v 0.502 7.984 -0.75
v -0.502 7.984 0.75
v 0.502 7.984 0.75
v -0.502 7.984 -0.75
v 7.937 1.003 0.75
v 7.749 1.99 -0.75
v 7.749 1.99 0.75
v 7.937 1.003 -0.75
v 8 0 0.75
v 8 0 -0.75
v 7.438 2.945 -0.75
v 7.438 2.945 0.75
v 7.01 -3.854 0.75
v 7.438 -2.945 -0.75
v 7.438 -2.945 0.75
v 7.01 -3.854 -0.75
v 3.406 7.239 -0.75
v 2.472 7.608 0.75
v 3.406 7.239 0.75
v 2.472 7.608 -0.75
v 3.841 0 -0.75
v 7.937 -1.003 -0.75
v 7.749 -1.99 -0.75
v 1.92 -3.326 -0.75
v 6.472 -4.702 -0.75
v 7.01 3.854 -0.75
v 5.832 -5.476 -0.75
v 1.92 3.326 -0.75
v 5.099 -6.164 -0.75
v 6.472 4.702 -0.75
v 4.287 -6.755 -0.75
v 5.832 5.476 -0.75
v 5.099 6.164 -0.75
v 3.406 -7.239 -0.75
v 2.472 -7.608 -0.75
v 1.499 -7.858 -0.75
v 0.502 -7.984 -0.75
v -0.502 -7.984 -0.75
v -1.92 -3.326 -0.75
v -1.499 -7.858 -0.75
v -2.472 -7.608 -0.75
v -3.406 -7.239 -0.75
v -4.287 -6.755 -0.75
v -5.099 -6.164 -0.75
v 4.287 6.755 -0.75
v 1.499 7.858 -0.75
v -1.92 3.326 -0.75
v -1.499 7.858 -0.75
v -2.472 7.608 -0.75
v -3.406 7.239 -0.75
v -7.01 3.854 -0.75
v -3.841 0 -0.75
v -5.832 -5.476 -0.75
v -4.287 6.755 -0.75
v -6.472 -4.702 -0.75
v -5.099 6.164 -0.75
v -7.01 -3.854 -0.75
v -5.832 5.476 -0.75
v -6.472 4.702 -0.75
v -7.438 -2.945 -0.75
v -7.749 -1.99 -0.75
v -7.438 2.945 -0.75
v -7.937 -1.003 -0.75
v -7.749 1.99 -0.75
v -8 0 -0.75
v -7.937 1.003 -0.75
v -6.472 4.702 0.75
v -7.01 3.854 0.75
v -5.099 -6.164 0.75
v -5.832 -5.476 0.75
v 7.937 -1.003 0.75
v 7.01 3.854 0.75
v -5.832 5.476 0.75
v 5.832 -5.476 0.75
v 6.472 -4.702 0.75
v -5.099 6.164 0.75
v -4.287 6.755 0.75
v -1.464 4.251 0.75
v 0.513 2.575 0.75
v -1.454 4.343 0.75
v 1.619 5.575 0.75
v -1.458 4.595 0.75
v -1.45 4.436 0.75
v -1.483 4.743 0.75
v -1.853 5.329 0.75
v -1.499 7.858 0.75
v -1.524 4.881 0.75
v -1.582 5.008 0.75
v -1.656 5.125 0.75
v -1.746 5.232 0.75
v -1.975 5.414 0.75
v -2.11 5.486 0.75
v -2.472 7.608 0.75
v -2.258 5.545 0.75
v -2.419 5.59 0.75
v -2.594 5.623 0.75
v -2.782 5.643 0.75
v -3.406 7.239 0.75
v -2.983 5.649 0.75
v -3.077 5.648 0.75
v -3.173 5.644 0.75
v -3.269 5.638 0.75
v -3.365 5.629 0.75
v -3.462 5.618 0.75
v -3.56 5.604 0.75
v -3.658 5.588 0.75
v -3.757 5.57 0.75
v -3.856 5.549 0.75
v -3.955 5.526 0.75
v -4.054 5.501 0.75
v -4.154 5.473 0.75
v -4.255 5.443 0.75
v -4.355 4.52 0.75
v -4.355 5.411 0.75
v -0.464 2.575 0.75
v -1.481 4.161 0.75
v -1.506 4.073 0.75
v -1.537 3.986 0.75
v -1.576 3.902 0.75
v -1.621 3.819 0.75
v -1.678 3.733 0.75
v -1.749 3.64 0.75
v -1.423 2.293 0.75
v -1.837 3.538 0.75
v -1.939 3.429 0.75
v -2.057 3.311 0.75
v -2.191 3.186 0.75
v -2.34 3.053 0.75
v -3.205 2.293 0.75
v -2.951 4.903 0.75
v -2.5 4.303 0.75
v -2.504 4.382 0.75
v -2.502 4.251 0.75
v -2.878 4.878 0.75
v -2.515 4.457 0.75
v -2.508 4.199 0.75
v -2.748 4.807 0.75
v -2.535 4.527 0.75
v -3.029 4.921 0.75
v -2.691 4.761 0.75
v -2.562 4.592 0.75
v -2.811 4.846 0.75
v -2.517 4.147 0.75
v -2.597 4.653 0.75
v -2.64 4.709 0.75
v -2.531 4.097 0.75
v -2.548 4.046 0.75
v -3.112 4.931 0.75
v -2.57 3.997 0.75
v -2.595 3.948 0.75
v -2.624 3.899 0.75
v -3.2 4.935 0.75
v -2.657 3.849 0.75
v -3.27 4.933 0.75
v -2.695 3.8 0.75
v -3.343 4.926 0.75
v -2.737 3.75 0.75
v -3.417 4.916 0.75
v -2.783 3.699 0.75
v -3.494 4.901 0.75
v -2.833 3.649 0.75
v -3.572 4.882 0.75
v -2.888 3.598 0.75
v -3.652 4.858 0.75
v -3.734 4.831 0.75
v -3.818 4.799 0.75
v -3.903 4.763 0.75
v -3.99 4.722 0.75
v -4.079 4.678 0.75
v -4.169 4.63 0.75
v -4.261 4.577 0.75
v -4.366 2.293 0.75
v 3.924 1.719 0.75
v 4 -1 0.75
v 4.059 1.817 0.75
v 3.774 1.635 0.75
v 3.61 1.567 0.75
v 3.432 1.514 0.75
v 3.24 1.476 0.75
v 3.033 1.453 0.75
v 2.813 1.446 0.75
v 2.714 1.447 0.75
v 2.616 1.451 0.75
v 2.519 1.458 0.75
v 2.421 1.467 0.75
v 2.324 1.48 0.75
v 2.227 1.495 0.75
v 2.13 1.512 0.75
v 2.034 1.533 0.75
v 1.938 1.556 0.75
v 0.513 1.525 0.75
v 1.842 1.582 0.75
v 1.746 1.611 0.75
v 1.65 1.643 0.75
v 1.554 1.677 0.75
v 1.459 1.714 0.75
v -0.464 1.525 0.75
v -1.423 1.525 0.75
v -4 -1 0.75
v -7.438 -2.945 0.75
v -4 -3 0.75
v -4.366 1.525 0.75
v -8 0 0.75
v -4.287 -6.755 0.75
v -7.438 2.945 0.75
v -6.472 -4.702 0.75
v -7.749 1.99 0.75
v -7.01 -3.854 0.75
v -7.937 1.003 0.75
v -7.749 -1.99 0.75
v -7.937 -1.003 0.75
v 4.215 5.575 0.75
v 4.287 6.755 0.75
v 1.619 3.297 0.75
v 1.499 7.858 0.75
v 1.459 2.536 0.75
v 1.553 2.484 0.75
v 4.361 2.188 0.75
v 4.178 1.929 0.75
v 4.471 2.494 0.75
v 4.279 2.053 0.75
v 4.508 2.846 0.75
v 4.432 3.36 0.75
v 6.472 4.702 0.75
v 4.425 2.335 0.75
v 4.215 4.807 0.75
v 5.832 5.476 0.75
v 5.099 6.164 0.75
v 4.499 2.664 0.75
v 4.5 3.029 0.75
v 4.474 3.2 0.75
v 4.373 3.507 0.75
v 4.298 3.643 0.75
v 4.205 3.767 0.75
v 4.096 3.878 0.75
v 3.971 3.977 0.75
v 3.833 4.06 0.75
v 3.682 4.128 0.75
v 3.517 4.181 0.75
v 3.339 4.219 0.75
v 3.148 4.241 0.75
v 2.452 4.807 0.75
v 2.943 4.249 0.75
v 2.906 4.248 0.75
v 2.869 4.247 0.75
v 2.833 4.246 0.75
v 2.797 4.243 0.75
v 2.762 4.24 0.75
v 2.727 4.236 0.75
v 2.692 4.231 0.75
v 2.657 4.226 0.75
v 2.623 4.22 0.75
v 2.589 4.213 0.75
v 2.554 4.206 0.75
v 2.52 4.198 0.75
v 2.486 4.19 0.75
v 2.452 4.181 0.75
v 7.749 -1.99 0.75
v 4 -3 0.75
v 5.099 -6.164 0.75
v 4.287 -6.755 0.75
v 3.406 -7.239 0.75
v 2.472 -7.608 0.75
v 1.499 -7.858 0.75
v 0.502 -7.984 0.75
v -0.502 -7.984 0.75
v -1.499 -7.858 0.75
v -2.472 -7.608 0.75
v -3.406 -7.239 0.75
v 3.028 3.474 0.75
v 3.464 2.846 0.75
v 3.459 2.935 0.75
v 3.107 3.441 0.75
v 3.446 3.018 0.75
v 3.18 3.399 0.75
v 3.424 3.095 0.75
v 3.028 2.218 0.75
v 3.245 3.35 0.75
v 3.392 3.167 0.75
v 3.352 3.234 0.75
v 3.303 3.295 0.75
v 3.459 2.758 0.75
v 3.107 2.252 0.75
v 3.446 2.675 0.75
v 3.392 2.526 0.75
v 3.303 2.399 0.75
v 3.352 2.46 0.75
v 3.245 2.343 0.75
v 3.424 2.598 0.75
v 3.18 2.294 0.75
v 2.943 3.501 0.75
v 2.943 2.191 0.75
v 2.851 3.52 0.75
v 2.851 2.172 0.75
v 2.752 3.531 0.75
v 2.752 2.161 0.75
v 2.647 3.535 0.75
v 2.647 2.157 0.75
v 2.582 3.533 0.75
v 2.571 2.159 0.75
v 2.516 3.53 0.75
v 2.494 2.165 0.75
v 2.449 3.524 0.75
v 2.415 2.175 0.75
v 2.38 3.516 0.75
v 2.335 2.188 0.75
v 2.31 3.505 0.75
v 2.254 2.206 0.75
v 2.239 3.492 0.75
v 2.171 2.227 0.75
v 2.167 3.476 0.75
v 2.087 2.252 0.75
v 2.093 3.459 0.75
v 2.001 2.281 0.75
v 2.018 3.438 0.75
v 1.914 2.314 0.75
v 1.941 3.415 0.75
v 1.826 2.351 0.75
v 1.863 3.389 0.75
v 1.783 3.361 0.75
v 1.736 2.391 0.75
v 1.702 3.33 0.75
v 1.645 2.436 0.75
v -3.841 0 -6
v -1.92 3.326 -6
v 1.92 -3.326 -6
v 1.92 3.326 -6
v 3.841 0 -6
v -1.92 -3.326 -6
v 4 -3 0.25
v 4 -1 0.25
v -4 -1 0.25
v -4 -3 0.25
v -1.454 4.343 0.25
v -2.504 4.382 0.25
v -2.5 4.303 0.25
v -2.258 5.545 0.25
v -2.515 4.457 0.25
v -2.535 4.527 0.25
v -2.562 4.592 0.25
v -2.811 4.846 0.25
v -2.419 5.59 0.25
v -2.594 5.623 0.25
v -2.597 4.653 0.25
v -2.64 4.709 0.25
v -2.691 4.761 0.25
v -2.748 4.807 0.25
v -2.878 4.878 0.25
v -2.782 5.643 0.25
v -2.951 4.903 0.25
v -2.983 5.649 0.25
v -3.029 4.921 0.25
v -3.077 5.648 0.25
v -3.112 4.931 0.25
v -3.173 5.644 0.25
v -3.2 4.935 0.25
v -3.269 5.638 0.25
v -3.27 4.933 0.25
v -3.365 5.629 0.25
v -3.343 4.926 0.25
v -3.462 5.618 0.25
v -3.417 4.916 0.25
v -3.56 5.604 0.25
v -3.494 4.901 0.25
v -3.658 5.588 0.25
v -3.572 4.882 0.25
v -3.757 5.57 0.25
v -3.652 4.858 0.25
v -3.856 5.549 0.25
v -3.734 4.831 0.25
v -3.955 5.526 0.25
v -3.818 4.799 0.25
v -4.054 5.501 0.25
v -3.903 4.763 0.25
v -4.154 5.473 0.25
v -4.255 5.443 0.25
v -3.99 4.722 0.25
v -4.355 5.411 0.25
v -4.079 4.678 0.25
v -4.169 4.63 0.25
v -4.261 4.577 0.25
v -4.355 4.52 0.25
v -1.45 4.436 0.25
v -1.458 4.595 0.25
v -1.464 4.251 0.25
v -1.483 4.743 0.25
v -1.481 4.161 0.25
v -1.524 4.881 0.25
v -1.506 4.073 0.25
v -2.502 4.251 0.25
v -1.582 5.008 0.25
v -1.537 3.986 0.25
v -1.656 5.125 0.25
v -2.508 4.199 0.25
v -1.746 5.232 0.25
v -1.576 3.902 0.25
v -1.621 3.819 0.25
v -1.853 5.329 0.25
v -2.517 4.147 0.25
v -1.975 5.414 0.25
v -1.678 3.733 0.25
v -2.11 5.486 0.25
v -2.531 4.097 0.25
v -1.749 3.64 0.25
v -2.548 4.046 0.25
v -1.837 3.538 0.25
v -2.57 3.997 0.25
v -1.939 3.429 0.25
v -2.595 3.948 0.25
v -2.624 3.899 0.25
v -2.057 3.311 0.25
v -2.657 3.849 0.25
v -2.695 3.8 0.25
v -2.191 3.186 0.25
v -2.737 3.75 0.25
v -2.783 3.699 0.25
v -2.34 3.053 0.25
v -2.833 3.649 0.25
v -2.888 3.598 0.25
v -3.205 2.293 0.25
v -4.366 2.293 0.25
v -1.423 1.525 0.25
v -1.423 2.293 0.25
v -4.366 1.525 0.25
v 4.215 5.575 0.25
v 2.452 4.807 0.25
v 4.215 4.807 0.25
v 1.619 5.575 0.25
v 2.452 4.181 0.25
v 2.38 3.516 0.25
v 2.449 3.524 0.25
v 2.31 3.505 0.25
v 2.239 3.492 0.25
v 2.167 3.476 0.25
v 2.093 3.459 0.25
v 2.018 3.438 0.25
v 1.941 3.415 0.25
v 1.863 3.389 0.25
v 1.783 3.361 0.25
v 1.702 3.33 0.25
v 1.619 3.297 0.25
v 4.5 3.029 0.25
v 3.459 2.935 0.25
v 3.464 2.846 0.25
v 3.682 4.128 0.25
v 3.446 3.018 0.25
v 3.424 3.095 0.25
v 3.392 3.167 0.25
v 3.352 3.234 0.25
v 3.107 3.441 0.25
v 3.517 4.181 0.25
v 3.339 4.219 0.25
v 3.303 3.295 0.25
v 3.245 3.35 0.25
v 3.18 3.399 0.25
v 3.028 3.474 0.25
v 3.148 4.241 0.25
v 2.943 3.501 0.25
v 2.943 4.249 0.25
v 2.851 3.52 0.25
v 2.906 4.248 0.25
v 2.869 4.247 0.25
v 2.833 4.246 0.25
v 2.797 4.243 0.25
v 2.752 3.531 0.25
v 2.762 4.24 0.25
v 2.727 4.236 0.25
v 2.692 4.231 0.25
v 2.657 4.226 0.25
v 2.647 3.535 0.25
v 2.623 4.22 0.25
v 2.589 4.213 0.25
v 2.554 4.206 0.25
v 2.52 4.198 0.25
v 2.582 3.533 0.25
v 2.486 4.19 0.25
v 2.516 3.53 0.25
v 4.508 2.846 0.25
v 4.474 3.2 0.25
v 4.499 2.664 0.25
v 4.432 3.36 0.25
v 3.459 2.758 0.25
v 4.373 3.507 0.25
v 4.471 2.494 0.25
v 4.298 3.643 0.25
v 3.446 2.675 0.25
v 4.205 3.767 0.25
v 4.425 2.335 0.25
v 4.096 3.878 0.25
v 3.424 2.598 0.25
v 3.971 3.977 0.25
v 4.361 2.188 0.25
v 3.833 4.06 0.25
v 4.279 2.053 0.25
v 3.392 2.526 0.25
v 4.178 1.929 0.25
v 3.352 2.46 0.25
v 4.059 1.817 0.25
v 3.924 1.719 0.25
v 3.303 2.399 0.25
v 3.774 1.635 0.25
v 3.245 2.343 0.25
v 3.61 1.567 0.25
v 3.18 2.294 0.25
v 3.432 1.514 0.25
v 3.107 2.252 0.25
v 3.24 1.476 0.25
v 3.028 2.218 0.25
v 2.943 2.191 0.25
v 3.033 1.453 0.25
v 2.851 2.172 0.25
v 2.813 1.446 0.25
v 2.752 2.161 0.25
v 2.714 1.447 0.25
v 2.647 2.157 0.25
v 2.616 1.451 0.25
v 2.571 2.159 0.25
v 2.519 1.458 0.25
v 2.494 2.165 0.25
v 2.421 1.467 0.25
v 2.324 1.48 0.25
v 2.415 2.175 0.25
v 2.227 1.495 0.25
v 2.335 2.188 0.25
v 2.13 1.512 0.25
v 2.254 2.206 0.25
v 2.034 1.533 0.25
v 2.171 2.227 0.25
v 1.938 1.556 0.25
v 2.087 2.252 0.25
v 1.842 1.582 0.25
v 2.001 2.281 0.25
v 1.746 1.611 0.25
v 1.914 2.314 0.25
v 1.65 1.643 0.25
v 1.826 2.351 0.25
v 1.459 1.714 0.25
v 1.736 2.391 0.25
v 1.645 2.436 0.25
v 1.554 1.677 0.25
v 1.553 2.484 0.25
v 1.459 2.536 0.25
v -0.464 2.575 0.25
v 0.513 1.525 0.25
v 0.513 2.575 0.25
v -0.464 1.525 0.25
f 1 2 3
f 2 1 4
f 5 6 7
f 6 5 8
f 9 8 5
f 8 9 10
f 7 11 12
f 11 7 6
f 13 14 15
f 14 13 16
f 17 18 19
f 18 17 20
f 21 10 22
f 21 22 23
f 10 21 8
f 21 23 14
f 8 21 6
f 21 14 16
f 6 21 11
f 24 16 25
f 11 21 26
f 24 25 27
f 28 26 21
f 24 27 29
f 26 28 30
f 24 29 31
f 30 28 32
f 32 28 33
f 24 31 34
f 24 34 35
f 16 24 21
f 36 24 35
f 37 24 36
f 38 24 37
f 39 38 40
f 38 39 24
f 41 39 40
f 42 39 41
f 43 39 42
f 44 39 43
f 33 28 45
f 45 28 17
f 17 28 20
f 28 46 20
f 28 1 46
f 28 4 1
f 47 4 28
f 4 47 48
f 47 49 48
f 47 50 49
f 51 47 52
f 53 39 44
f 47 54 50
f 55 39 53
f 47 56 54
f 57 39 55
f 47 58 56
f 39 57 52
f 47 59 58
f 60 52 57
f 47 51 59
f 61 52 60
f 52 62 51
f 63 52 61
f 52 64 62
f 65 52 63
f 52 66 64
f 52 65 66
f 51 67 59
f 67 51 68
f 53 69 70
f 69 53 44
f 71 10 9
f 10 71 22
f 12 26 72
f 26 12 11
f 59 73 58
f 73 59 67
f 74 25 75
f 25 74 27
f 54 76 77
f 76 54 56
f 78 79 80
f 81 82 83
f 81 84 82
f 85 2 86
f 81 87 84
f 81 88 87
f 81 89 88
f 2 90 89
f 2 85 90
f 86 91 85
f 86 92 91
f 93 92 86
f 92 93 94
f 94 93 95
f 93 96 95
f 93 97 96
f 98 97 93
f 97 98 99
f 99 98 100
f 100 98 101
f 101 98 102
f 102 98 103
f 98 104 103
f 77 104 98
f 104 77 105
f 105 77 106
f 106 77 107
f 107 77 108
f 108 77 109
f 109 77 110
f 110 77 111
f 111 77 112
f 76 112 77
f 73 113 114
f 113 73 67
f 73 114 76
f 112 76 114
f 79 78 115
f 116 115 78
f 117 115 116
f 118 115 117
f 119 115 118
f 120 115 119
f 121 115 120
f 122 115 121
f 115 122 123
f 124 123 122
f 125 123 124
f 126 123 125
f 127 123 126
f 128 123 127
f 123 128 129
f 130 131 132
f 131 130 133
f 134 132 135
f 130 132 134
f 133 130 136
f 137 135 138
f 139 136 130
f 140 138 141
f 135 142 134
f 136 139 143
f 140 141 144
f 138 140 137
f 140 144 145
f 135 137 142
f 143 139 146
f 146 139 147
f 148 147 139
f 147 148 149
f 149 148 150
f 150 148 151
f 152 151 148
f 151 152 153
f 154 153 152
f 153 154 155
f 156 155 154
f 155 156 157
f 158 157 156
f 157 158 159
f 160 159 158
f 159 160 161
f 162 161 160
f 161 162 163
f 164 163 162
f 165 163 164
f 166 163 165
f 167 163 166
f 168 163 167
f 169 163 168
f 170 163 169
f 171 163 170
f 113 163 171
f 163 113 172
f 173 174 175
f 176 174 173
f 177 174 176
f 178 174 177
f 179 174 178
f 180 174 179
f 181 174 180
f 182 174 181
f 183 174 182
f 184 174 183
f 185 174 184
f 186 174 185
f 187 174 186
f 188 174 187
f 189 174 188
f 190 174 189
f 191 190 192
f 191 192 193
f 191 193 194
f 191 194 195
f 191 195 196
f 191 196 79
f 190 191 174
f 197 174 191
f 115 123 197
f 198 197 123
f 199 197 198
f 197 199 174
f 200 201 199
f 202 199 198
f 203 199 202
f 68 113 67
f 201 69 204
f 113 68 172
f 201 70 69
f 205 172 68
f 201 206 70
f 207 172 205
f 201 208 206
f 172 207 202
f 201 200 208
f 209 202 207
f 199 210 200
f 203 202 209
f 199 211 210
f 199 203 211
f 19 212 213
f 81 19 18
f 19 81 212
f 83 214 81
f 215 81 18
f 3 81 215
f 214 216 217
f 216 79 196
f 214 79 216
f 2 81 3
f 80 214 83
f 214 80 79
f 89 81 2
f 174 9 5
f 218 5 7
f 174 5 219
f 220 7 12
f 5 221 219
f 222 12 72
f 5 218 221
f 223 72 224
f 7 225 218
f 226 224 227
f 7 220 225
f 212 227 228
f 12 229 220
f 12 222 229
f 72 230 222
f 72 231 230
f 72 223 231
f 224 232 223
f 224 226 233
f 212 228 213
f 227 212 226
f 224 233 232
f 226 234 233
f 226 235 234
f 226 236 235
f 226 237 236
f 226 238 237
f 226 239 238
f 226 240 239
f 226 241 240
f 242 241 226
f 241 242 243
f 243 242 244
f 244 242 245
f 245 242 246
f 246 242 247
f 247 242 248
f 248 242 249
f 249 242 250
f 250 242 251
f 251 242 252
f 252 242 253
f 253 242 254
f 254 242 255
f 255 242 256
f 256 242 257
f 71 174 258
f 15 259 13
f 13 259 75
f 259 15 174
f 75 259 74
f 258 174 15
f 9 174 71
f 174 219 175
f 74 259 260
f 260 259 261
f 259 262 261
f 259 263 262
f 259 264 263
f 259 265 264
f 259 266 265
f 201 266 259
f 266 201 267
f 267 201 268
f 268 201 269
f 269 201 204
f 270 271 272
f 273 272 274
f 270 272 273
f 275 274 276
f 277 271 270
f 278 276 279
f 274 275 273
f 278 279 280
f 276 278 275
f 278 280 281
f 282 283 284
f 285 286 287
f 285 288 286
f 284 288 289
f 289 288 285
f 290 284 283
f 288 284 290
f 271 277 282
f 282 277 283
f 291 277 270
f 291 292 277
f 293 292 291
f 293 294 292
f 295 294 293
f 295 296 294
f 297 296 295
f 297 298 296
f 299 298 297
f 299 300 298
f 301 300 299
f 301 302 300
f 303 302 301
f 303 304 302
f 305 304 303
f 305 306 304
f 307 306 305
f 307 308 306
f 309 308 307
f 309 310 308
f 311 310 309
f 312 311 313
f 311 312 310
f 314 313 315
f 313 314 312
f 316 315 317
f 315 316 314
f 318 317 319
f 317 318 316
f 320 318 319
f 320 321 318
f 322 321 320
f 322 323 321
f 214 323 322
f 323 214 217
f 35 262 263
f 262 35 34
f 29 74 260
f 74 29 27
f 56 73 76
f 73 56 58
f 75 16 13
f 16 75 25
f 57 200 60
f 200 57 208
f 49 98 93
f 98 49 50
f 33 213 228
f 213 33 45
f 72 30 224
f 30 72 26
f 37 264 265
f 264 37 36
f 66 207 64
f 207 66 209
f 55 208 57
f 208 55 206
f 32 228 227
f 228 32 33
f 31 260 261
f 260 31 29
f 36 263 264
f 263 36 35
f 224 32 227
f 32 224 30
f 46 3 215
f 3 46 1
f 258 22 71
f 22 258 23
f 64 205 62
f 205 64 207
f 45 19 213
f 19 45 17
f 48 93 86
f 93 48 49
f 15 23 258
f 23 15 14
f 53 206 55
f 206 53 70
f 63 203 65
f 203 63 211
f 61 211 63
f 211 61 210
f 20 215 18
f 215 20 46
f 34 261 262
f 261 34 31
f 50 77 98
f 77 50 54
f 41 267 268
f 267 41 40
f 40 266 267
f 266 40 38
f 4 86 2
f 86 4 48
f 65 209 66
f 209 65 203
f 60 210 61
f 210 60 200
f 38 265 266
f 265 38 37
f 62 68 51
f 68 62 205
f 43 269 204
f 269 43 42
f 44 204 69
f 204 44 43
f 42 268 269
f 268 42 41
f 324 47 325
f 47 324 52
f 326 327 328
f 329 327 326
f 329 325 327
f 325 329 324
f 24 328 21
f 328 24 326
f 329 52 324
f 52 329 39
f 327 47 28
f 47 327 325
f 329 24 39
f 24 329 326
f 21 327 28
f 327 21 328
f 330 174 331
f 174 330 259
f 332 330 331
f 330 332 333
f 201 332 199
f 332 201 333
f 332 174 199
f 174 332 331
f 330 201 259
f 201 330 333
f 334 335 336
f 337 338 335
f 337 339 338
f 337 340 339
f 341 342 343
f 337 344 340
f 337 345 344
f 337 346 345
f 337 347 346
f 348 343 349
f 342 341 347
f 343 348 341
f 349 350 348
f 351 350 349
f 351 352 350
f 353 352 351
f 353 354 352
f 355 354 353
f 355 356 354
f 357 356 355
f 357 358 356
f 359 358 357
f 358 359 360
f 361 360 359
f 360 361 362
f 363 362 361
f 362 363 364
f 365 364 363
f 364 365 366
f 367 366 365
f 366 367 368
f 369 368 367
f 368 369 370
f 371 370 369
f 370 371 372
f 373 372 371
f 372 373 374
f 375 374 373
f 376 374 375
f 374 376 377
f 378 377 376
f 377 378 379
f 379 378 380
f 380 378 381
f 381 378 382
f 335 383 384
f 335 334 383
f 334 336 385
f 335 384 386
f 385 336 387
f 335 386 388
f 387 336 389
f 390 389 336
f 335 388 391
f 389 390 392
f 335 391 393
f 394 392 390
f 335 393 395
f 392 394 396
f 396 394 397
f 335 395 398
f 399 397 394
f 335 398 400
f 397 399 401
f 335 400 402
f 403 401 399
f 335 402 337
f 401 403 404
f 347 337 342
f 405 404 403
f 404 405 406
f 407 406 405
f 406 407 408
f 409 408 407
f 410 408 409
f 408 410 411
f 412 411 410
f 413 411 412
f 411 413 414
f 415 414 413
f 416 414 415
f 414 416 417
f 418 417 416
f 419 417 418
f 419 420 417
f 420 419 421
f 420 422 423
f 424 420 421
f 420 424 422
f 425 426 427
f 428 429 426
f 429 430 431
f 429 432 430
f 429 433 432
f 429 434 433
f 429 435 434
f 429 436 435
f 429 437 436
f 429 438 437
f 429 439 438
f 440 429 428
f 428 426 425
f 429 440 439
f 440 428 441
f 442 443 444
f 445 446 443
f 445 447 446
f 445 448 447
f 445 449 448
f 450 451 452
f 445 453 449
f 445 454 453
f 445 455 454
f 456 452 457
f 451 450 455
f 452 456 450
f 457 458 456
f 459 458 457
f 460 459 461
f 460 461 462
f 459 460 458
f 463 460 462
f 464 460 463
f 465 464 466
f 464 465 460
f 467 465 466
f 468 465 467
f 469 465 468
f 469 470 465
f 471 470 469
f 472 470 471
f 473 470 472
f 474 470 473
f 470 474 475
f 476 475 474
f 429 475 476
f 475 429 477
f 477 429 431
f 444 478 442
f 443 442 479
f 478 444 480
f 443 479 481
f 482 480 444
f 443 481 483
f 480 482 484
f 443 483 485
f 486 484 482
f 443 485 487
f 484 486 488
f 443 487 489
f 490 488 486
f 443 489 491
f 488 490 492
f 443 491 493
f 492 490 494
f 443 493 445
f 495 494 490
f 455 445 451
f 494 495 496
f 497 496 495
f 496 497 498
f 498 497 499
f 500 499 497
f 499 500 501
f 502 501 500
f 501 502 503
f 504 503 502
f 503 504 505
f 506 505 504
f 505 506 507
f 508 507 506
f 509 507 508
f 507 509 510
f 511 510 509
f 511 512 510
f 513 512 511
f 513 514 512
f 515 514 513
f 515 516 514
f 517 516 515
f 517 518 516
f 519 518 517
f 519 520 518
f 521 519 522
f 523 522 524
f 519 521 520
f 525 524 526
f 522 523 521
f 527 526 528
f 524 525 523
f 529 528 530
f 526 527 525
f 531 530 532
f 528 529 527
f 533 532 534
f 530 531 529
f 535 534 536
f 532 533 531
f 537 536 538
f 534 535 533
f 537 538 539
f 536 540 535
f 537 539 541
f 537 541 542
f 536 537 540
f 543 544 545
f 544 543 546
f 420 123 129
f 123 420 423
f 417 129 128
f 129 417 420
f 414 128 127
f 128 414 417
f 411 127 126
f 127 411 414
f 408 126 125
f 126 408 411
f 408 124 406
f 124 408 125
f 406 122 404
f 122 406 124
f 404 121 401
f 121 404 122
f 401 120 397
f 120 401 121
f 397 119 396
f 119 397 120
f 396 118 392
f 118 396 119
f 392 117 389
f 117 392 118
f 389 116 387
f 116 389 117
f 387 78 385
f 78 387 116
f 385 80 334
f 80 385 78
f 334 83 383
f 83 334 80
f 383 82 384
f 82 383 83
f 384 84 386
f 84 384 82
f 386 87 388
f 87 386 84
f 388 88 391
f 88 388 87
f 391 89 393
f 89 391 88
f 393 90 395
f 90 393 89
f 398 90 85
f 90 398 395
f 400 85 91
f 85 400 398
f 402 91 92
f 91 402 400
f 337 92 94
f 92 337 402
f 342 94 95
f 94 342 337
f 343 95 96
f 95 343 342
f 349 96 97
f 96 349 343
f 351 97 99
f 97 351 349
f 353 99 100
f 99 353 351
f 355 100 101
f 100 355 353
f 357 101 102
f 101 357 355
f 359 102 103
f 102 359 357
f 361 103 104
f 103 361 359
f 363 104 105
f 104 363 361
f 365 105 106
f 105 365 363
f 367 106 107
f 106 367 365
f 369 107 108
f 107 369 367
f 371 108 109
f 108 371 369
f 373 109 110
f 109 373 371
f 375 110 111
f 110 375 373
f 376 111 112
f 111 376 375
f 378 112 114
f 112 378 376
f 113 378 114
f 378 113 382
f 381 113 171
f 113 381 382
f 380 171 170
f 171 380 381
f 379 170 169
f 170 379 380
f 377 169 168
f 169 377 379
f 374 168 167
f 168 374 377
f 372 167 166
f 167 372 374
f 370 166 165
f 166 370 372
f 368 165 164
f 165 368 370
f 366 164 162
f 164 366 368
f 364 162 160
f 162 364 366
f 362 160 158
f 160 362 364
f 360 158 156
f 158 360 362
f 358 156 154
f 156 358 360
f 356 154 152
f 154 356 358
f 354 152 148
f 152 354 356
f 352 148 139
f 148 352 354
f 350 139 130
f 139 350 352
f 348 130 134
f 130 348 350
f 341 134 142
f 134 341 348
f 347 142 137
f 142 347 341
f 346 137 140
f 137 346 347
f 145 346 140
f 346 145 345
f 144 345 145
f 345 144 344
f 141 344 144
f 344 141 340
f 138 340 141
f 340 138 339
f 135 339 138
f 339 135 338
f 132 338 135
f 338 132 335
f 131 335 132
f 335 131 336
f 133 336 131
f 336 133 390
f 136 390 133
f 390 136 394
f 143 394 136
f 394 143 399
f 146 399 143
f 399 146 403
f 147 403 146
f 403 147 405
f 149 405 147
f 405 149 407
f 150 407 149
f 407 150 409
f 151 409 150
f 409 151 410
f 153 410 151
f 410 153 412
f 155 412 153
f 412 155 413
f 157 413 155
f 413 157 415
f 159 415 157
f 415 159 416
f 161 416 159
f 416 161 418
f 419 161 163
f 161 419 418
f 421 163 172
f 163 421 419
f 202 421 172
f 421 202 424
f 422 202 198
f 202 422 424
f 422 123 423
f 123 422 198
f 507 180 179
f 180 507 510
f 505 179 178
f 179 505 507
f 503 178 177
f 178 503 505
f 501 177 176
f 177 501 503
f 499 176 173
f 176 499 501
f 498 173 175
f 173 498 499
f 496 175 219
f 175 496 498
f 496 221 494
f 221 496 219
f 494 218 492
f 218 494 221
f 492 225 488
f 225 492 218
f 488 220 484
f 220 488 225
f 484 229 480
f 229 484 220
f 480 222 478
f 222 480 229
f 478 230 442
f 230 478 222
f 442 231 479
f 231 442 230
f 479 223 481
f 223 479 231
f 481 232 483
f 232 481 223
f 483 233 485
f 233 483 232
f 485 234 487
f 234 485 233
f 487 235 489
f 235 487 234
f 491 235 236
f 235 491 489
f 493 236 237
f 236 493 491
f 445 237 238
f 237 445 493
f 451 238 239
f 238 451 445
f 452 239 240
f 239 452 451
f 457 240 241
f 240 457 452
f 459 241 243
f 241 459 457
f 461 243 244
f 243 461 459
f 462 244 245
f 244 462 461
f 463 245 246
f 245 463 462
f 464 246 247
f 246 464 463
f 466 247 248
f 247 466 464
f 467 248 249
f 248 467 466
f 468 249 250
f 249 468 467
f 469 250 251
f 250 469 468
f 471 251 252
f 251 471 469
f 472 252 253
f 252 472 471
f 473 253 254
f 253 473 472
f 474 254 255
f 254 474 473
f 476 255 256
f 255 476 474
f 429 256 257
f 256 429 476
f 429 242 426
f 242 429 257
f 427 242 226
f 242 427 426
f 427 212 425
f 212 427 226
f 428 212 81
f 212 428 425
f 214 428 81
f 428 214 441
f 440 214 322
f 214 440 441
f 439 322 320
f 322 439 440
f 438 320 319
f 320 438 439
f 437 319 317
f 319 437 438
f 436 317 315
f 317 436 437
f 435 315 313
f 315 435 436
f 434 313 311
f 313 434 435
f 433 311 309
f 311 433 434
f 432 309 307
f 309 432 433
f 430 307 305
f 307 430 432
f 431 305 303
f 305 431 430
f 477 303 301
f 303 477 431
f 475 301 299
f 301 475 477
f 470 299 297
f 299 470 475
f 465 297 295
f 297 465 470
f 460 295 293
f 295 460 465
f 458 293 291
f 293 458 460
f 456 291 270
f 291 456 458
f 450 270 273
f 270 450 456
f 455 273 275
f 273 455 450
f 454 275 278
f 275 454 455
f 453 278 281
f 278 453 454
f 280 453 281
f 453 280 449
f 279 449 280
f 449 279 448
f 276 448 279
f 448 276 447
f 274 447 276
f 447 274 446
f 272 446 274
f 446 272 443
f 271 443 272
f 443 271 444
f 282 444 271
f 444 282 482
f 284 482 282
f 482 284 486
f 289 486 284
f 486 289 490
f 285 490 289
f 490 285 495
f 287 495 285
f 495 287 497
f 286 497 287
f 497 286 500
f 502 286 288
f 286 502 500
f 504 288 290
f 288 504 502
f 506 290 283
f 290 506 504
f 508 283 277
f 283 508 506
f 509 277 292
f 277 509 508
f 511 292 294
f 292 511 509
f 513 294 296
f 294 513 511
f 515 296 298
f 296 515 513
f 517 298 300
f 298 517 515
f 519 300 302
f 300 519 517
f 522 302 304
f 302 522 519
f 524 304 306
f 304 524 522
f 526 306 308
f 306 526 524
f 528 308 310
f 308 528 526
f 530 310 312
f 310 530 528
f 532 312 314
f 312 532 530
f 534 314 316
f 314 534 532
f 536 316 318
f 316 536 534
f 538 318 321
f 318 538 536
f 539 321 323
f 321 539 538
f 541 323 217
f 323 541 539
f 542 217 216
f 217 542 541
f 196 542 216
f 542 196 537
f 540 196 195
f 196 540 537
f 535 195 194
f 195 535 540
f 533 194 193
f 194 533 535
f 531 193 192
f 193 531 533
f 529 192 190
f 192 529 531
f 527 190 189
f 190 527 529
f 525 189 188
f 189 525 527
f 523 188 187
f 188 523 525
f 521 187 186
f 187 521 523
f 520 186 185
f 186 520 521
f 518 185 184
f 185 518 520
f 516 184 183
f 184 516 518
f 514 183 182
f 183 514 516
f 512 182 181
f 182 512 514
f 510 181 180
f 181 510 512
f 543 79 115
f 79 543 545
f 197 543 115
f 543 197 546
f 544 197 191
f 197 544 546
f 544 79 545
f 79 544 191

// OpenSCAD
$fn = 50;


difference() {
	union() {
		translate(v = [0, 0, -0.7500000000]) {
			cylinder(h = 1.5000000000, r = 8.0000000000);
		}
		translate(v = [0, 0, -6]) {
			linear_extrude(height = 6) {
				polygon(points = [[3.8408550000, 0.0000000000], [1.9204275000, 3.3262780023], [-1.9204275000, 3.3262780023], [-3.8408550000, 0.0000000000], [-1.9204275000, -3.3262780023], [1.9204275000, -3.3262780023]]);
			}
		}
	}
	union() {
		#translate(v = [-4.0000000000, -3.0000000000, 0.2500000000]) {
			cube(size = [8, 2, 0.5000000000]);
		}
		#translate(v = [0, 3.5000000000, 0.2500000000]) {
			linear_extrude(height = 0.5000000000) {
				text(font = "SegoiUI:Bold", halign = "center", size = 4, text = "2.5", valign = "center");
			}
		}
	}
}
